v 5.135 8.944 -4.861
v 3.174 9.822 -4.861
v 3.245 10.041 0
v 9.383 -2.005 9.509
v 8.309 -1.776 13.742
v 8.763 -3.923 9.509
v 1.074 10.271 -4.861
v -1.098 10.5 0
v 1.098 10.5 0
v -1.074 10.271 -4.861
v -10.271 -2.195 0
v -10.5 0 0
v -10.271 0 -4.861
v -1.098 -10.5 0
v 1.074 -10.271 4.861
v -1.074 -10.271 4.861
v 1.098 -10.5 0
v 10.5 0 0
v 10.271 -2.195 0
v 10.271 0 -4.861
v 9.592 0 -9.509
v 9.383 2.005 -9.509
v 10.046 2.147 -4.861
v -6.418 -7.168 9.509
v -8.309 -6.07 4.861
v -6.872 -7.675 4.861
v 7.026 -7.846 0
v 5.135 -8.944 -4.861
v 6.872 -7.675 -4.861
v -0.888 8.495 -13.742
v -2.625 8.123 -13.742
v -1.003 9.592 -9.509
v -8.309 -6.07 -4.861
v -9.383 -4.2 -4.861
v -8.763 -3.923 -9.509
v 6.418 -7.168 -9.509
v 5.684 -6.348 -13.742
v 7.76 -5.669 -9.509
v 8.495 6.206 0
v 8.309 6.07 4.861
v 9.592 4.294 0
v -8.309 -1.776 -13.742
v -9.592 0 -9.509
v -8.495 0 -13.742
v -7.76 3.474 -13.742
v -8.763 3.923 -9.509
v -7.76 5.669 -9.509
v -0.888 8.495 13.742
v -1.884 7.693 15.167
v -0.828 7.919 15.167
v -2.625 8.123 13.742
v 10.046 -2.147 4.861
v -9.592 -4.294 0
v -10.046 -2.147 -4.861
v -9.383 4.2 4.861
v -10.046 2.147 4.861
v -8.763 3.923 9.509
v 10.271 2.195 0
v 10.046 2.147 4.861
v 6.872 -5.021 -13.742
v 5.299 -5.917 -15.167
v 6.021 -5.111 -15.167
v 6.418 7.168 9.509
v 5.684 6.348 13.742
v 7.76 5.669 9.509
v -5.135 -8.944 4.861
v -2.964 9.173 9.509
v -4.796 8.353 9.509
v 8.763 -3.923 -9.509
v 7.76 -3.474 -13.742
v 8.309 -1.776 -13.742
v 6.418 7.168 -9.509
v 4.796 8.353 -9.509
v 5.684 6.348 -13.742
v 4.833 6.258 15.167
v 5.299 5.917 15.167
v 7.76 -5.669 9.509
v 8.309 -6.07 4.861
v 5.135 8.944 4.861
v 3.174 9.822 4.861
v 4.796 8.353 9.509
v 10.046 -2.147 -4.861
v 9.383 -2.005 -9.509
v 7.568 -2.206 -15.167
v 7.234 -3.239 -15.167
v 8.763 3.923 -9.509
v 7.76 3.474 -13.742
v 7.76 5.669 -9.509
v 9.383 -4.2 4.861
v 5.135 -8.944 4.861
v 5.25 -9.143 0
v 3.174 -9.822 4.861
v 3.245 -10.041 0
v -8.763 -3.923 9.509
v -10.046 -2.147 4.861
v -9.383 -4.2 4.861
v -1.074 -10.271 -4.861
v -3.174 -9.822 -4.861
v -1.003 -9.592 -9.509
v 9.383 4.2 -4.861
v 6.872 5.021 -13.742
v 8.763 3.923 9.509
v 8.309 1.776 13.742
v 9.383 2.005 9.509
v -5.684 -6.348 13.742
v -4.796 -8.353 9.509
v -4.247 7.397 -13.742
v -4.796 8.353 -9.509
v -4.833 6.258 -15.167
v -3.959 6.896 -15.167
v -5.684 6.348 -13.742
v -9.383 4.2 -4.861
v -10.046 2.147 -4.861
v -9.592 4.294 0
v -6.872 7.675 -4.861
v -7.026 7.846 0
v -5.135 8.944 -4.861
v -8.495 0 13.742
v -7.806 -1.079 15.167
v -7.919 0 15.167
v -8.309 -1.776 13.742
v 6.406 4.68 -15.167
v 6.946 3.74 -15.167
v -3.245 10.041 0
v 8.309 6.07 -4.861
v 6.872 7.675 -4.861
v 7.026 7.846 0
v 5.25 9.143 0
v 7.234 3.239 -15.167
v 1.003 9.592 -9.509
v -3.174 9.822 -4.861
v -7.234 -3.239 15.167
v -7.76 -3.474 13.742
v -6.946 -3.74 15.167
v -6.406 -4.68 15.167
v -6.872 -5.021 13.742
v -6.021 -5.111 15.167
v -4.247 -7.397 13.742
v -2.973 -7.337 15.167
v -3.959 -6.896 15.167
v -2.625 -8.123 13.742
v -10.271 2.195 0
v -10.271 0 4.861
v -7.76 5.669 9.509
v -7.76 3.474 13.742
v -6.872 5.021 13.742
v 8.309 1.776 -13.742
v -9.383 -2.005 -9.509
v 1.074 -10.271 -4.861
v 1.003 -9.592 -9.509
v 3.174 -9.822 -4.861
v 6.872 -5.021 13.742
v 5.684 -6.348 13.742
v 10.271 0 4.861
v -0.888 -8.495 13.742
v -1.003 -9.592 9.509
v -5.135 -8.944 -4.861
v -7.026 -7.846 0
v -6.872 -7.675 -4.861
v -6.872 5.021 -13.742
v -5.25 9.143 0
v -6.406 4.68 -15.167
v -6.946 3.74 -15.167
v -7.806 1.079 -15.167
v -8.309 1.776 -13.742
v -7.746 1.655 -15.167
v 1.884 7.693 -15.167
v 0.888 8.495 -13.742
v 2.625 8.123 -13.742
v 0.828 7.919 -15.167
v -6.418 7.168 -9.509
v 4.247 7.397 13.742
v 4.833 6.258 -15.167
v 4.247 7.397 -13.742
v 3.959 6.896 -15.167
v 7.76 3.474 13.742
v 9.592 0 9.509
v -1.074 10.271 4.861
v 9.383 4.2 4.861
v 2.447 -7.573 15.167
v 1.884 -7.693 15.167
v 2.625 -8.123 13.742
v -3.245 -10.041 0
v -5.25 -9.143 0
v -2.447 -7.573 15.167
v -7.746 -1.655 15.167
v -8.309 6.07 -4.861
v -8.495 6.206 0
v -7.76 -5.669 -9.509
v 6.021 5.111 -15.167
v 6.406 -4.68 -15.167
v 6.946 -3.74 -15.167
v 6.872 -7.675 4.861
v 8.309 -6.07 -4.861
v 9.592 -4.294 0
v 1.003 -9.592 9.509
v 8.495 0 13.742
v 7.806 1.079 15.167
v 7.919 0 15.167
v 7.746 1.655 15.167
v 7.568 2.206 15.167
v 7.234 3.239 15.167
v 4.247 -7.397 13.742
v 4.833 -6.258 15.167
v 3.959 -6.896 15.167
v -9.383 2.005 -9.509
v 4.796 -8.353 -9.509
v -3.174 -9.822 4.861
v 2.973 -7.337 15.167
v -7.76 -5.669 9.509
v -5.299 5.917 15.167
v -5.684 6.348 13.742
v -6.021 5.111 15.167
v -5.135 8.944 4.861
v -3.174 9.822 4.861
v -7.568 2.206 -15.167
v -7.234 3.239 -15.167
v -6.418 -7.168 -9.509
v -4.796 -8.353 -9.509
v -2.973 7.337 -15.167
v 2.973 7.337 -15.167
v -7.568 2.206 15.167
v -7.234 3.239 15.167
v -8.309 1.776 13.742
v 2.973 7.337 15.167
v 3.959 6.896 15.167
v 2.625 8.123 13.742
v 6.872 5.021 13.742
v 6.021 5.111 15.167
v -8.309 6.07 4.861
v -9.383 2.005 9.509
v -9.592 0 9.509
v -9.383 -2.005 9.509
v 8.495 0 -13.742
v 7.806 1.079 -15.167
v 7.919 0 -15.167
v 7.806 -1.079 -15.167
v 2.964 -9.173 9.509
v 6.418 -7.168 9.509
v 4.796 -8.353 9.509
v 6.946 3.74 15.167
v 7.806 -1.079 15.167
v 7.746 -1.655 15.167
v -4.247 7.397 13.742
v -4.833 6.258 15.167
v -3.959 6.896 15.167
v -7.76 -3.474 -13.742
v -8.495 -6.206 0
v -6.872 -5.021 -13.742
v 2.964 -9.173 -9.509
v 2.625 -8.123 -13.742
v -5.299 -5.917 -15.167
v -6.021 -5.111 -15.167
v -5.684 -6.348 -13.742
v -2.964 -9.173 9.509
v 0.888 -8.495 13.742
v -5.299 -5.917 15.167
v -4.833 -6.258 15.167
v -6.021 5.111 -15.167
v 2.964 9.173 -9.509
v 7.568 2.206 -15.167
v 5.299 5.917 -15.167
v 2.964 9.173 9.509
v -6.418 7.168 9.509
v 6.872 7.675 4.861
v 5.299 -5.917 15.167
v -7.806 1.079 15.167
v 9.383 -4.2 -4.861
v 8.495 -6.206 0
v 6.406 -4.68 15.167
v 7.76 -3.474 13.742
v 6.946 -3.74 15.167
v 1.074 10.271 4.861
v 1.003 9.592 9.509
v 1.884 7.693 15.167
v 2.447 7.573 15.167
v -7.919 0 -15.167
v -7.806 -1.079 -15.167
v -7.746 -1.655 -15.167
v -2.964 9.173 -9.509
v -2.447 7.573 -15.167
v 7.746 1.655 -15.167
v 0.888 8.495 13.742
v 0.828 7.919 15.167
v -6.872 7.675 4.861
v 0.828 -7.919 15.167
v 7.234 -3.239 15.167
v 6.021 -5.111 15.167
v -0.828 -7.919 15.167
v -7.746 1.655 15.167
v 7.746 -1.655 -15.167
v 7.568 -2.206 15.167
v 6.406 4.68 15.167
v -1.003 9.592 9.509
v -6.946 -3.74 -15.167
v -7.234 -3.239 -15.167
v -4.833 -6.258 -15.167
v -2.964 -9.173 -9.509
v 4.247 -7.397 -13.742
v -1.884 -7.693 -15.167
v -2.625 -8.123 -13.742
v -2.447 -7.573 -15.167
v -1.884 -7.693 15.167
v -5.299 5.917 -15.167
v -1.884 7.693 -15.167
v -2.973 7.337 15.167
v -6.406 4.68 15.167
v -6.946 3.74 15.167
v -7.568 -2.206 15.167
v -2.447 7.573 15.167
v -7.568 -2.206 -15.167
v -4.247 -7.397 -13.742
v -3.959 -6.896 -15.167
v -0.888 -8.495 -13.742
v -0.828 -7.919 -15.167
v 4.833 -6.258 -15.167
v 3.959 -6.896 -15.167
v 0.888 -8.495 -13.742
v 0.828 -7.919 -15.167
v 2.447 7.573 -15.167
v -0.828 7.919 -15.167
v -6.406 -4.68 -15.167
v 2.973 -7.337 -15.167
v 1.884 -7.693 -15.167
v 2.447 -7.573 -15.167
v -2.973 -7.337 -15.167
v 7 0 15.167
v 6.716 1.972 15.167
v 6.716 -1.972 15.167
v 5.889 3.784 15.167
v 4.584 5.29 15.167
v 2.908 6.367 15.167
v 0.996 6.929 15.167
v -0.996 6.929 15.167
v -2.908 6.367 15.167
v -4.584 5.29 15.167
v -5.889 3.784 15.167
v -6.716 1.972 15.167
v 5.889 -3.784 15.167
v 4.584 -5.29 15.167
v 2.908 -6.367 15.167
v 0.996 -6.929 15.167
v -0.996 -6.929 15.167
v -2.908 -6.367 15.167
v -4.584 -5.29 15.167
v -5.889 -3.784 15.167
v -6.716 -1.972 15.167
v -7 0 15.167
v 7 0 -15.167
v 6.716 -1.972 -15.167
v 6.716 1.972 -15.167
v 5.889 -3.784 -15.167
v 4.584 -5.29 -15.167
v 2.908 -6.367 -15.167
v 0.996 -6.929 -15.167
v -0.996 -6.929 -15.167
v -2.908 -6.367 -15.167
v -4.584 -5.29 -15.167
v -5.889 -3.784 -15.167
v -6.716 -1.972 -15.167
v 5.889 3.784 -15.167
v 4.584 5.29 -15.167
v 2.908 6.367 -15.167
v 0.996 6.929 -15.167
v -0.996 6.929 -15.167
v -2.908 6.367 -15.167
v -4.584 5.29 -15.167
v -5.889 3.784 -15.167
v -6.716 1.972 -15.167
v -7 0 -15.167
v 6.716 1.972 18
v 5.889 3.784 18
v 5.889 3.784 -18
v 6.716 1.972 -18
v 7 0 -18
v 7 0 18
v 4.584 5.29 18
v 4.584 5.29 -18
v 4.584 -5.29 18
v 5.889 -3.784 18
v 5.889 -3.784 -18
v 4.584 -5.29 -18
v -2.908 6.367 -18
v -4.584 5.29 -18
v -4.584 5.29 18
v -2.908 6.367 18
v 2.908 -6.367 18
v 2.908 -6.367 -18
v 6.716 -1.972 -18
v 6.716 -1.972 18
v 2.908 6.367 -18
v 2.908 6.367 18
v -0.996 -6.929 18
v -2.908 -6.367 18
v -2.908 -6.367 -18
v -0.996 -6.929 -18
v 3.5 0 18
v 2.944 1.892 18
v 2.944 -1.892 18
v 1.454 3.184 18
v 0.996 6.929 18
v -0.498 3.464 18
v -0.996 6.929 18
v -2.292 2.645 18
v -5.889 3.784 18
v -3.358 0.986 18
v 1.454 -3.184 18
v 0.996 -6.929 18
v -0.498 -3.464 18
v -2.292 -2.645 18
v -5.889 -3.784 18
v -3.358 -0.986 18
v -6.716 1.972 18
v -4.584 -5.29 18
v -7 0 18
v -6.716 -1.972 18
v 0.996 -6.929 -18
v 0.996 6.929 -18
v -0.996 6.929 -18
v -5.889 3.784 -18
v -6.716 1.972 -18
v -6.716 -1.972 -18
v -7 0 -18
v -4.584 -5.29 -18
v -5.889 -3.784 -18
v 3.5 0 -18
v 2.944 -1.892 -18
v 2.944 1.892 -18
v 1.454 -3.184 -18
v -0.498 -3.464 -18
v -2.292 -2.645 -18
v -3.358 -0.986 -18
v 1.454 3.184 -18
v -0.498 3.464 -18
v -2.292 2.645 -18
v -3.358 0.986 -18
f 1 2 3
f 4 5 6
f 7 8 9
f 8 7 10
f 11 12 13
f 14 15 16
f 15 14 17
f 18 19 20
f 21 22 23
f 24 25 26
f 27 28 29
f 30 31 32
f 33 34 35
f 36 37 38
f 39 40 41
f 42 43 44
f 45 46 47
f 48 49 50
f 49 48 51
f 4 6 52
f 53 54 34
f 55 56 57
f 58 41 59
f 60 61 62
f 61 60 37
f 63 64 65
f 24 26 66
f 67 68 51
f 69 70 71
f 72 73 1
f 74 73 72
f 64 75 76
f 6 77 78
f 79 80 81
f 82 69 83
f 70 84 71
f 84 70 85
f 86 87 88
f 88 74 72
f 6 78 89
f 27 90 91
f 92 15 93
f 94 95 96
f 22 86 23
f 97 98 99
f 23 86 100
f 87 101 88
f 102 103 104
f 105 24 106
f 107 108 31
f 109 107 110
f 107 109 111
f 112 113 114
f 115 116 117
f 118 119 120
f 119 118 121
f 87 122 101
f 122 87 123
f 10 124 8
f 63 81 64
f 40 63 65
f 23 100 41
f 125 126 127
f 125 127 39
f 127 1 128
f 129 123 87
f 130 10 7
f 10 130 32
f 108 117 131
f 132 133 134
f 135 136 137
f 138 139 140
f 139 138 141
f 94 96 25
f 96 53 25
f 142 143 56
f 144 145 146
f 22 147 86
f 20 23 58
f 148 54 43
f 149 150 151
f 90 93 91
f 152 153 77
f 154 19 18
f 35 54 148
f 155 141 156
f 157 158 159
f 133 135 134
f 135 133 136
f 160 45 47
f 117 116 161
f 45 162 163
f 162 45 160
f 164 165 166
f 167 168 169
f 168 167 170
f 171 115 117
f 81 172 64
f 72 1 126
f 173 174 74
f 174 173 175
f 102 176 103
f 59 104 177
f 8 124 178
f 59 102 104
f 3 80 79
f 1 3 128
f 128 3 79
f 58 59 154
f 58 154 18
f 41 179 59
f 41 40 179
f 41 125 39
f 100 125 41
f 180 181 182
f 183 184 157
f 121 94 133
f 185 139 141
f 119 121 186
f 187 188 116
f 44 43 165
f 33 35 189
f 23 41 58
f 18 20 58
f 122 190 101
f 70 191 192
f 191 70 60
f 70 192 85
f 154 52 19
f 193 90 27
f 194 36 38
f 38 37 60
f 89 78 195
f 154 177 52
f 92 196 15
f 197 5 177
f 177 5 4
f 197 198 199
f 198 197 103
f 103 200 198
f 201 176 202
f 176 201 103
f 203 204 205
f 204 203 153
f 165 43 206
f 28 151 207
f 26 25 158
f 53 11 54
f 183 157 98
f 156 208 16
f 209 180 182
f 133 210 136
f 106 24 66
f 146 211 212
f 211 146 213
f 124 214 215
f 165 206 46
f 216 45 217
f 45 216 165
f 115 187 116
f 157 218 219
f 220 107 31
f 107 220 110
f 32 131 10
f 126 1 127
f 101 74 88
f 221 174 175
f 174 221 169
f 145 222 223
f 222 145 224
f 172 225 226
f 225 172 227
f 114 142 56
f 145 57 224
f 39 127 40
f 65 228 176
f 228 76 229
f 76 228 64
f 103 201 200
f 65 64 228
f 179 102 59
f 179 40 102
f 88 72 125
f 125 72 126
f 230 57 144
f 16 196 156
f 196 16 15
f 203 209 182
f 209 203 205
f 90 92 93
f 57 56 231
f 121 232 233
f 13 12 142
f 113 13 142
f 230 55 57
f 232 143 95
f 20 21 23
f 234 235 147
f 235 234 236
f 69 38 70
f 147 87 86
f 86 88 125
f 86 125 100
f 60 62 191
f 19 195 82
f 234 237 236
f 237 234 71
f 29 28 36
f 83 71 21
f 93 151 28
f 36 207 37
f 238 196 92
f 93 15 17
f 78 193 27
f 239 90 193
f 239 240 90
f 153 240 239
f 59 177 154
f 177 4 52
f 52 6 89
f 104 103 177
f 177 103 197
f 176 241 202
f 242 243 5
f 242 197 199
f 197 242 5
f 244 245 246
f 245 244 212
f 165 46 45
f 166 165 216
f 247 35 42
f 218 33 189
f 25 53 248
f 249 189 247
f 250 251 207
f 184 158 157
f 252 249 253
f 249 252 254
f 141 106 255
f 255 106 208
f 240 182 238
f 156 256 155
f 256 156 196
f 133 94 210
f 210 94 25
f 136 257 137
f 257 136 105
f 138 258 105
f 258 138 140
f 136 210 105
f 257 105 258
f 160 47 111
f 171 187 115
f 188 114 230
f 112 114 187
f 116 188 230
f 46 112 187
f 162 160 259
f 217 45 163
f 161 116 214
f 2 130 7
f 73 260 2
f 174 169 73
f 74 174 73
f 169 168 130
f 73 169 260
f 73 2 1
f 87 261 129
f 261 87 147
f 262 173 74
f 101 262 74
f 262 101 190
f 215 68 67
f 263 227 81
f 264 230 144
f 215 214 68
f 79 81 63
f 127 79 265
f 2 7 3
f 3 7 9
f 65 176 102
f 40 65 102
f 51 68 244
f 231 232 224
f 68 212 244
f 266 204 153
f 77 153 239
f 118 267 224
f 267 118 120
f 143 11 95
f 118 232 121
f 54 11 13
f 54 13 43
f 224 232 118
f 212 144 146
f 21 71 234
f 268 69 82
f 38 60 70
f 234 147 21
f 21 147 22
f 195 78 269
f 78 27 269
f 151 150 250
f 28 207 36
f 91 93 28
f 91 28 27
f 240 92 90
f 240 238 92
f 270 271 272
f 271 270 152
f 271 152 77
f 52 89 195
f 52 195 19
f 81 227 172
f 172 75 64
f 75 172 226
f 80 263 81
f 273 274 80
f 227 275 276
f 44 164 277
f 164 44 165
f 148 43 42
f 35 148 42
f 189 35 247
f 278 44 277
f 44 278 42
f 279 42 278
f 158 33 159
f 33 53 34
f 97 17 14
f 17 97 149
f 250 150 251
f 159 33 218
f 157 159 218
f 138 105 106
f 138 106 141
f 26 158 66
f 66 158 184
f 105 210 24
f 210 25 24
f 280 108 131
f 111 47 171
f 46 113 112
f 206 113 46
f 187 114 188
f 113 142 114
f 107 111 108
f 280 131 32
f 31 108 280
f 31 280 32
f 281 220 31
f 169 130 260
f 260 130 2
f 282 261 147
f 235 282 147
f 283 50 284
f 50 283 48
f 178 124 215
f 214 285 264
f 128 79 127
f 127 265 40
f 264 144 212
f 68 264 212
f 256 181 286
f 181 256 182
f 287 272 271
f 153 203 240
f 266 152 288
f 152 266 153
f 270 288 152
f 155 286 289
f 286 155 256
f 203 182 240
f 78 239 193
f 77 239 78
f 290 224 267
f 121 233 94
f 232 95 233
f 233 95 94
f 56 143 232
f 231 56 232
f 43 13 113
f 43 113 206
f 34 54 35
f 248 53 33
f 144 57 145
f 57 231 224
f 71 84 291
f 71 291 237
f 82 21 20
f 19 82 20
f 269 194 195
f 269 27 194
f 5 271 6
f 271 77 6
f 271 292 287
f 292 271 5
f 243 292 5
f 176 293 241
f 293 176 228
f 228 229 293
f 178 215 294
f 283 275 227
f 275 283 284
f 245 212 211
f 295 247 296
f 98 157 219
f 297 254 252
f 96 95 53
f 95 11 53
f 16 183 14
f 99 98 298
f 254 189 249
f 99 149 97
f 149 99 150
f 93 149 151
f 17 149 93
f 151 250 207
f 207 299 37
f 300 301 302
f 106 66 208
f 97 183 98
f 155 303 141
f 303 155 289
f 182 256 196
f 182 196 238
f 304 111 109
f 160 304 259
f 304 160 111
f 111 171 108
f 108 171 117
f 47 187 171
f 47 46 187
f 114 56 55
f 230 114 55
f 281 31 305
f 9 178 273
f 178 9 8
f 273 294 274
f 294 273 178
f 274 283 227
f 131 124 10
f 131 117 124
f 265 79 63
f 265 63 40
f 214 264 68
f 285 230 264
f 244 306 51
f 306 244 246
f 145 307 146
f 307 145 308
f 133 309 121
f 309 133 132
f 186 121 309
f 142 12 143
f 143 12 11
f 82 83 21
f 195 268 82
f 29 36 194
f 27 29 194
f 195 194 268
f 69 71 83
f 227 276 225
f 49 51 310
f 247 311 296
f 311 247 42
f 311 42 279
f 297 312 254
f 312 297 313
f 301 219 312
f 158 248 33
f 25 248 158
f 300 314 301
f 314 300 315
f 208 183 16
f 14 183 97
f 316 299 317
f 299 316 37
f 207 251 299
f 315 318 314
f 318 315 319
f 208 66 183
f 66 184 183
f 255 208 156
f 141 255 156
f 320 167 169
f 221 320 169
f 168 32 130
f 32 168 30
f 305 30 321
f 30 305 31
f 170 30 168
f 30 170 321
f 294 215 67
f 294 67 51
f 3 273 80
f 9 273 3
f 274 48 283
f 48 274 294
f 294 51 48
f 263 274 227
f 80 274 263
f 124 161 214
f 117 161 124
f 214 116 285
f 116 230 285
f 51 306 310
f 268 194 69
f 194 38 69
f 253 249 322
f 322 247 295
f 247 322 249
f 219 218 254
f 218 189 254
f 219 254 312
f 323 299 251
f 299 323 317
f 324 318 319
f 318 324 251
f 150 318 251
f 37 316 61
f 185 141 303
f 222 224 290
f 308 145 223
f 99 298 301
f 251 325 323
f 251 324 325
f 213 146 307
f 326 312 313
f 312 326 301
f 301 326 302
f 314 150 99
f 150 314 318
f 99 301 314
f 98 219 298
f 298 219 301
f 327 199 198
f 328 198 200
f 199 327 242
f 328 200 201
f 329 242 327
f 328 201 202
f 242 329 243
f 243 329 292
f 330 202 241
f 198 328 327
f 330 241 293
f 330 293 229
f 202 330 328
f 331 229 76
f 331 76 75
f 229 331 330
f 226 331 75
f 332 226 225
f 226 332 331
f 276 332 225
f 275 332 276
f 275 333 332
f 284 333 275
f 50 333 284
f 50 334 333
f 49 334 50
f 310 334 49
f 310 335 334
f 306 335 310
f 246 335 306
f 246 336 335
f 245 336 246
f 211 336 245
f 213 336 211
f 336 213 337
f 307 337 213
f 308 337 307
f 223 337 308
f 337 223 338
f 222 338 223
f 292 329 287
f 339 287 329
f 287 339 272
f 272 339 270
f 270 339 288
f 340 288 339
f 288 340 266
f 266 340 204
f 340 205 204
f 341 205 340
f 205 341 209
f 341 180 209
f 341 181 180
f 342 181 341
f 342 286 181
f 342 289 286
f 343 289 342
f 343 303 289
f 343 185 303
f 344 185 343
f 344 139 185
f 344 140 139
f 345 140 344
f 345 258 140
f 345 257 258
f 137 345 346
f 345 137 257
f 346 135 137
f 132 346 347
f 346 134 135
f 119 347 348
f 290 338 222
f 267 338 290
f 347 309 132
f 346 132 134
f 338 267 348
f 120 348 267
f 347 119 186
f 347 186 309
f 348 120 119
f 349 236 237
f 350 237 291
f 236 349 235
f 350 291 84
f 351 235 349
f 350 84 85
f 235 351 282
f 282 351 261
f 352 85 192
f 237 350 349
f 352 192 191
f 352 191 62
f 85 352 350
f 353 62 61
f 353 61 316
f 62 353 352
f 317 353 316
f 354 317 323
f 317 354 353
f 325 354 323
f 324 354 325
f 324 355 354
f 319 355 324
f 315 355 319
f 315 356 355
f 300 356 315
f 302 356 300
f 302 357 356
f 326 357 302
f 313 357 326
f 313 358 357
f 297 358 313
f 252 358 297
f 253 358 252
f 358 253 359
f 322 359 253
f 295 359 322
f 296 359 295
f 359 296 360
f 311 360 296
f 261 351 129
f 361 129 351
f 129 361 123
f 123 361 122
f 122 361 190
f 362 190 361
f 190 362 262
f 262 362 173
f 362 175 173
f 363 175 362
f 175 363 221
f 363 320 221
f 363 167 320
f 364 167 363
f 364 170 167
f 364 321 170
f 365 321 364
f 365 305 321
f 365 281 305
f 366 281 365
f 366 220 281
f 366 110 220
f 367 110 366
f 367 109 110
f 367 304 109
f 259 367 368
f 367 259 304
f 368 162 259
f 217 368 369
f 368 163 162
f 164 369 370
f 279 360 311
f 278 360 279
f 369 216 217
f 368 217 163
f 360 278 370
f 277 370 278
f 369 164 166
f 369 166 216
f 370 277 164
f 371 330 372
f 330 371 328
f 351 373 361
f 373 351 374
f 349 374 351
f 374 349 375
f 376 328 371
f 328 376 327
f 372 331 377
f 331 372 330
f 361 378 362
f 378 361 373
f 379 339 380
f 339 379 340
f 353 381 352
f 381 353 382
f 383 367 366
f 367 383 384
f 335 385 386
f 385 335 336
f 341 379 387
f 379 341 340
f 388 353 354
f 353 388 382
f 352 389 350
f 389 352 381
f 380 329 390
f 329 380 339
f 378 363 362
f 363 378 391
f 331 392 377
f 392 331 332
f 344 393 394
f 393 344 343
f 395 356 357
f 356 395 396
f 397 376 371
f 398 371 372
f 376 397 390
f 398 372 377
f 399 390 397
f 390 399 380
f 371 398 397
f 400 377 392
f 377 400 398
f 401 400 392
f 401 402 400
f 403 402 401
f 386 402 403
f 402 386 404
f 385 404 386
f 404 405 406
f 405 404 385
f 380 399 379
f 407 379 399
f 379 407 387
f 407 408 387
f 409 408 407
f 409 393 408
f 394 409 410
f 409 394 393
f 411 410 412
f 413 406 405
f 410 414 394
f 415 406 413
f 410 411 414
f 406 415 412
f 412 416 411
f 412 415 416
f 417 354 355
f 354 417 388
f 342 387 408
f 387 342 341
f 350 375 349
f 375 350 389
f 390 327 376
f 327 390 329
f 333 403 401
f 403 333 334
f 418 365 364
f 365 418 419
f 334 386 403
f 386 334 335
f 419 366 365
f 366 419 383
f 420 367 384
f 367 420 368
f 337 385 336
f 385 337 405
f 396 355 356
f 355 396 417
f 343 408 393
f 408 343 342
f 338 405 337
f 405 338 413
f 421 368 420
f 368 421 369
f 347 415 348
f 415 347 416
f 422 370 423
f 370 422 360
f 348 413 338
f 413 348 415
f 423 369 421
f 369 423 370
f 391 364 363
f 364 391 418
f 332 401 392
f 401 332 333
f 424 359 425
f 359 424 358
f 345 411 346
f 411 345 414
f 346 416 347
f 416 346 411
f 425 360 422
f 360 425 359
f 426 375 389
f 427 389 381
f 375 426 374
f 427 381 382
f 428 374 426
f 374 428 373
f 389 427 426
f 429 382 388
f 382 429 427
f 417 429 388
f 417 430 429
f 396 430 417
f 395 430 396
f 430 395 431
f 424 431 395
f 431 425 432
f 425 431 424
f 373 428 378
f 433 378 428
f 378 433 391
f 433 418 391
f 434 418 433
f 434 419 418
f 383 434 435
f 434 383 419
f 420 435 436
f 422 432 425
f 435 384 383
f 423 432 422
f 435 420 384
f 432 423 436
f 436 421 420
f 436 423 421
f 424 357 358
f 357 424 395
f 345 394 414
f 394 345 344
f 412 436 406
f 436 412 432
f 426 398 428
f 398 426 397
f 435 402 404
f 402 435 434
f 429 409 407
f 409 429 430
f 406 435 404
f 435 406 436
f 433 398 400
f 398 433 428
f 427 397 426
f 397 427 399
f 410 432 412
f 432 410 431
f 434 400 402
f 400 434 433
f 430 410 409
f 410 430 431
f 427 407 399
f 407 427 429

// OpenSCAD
module roller(){
	//resize([40,30,40]){sphere(r=90,center=true);}
	surface_h=24;
	inside_d=125;
	rim=5;
	hole=3.5;
	roller_w=hole*6;
	roller_a_h=inside_d/roller_w*inside_d/surface_h*1.5;
	//translate([55,0,0]){sphere(d=inside_d,center=true);} //to test curvature match
	difference(){
		union(){
			cylinder(h=surface_h*1.5,r=hole*2,center=true);
			difference(){
				resize([roller_w,roller_w,roller_a_h]){sphere(d=inside_d,center=true);}
				translate([0,0,surface_h*1.5]){cylinder(h=inside_d/3,d=inside_d, center=true);}
				translate([0,0,-surface_h*1.5]){cylinder(h=inside_d/3,d=inside_d, center=true);}
			}
		}
		cylinder(h=surface_h*2,r=hole,center=true);
	}
}
roller();
//print all 4 at once//
//translate([25,0,0]){roller();}
//translate([25,25,0]){roller();}
//translate([0,25,0]){roller();}
